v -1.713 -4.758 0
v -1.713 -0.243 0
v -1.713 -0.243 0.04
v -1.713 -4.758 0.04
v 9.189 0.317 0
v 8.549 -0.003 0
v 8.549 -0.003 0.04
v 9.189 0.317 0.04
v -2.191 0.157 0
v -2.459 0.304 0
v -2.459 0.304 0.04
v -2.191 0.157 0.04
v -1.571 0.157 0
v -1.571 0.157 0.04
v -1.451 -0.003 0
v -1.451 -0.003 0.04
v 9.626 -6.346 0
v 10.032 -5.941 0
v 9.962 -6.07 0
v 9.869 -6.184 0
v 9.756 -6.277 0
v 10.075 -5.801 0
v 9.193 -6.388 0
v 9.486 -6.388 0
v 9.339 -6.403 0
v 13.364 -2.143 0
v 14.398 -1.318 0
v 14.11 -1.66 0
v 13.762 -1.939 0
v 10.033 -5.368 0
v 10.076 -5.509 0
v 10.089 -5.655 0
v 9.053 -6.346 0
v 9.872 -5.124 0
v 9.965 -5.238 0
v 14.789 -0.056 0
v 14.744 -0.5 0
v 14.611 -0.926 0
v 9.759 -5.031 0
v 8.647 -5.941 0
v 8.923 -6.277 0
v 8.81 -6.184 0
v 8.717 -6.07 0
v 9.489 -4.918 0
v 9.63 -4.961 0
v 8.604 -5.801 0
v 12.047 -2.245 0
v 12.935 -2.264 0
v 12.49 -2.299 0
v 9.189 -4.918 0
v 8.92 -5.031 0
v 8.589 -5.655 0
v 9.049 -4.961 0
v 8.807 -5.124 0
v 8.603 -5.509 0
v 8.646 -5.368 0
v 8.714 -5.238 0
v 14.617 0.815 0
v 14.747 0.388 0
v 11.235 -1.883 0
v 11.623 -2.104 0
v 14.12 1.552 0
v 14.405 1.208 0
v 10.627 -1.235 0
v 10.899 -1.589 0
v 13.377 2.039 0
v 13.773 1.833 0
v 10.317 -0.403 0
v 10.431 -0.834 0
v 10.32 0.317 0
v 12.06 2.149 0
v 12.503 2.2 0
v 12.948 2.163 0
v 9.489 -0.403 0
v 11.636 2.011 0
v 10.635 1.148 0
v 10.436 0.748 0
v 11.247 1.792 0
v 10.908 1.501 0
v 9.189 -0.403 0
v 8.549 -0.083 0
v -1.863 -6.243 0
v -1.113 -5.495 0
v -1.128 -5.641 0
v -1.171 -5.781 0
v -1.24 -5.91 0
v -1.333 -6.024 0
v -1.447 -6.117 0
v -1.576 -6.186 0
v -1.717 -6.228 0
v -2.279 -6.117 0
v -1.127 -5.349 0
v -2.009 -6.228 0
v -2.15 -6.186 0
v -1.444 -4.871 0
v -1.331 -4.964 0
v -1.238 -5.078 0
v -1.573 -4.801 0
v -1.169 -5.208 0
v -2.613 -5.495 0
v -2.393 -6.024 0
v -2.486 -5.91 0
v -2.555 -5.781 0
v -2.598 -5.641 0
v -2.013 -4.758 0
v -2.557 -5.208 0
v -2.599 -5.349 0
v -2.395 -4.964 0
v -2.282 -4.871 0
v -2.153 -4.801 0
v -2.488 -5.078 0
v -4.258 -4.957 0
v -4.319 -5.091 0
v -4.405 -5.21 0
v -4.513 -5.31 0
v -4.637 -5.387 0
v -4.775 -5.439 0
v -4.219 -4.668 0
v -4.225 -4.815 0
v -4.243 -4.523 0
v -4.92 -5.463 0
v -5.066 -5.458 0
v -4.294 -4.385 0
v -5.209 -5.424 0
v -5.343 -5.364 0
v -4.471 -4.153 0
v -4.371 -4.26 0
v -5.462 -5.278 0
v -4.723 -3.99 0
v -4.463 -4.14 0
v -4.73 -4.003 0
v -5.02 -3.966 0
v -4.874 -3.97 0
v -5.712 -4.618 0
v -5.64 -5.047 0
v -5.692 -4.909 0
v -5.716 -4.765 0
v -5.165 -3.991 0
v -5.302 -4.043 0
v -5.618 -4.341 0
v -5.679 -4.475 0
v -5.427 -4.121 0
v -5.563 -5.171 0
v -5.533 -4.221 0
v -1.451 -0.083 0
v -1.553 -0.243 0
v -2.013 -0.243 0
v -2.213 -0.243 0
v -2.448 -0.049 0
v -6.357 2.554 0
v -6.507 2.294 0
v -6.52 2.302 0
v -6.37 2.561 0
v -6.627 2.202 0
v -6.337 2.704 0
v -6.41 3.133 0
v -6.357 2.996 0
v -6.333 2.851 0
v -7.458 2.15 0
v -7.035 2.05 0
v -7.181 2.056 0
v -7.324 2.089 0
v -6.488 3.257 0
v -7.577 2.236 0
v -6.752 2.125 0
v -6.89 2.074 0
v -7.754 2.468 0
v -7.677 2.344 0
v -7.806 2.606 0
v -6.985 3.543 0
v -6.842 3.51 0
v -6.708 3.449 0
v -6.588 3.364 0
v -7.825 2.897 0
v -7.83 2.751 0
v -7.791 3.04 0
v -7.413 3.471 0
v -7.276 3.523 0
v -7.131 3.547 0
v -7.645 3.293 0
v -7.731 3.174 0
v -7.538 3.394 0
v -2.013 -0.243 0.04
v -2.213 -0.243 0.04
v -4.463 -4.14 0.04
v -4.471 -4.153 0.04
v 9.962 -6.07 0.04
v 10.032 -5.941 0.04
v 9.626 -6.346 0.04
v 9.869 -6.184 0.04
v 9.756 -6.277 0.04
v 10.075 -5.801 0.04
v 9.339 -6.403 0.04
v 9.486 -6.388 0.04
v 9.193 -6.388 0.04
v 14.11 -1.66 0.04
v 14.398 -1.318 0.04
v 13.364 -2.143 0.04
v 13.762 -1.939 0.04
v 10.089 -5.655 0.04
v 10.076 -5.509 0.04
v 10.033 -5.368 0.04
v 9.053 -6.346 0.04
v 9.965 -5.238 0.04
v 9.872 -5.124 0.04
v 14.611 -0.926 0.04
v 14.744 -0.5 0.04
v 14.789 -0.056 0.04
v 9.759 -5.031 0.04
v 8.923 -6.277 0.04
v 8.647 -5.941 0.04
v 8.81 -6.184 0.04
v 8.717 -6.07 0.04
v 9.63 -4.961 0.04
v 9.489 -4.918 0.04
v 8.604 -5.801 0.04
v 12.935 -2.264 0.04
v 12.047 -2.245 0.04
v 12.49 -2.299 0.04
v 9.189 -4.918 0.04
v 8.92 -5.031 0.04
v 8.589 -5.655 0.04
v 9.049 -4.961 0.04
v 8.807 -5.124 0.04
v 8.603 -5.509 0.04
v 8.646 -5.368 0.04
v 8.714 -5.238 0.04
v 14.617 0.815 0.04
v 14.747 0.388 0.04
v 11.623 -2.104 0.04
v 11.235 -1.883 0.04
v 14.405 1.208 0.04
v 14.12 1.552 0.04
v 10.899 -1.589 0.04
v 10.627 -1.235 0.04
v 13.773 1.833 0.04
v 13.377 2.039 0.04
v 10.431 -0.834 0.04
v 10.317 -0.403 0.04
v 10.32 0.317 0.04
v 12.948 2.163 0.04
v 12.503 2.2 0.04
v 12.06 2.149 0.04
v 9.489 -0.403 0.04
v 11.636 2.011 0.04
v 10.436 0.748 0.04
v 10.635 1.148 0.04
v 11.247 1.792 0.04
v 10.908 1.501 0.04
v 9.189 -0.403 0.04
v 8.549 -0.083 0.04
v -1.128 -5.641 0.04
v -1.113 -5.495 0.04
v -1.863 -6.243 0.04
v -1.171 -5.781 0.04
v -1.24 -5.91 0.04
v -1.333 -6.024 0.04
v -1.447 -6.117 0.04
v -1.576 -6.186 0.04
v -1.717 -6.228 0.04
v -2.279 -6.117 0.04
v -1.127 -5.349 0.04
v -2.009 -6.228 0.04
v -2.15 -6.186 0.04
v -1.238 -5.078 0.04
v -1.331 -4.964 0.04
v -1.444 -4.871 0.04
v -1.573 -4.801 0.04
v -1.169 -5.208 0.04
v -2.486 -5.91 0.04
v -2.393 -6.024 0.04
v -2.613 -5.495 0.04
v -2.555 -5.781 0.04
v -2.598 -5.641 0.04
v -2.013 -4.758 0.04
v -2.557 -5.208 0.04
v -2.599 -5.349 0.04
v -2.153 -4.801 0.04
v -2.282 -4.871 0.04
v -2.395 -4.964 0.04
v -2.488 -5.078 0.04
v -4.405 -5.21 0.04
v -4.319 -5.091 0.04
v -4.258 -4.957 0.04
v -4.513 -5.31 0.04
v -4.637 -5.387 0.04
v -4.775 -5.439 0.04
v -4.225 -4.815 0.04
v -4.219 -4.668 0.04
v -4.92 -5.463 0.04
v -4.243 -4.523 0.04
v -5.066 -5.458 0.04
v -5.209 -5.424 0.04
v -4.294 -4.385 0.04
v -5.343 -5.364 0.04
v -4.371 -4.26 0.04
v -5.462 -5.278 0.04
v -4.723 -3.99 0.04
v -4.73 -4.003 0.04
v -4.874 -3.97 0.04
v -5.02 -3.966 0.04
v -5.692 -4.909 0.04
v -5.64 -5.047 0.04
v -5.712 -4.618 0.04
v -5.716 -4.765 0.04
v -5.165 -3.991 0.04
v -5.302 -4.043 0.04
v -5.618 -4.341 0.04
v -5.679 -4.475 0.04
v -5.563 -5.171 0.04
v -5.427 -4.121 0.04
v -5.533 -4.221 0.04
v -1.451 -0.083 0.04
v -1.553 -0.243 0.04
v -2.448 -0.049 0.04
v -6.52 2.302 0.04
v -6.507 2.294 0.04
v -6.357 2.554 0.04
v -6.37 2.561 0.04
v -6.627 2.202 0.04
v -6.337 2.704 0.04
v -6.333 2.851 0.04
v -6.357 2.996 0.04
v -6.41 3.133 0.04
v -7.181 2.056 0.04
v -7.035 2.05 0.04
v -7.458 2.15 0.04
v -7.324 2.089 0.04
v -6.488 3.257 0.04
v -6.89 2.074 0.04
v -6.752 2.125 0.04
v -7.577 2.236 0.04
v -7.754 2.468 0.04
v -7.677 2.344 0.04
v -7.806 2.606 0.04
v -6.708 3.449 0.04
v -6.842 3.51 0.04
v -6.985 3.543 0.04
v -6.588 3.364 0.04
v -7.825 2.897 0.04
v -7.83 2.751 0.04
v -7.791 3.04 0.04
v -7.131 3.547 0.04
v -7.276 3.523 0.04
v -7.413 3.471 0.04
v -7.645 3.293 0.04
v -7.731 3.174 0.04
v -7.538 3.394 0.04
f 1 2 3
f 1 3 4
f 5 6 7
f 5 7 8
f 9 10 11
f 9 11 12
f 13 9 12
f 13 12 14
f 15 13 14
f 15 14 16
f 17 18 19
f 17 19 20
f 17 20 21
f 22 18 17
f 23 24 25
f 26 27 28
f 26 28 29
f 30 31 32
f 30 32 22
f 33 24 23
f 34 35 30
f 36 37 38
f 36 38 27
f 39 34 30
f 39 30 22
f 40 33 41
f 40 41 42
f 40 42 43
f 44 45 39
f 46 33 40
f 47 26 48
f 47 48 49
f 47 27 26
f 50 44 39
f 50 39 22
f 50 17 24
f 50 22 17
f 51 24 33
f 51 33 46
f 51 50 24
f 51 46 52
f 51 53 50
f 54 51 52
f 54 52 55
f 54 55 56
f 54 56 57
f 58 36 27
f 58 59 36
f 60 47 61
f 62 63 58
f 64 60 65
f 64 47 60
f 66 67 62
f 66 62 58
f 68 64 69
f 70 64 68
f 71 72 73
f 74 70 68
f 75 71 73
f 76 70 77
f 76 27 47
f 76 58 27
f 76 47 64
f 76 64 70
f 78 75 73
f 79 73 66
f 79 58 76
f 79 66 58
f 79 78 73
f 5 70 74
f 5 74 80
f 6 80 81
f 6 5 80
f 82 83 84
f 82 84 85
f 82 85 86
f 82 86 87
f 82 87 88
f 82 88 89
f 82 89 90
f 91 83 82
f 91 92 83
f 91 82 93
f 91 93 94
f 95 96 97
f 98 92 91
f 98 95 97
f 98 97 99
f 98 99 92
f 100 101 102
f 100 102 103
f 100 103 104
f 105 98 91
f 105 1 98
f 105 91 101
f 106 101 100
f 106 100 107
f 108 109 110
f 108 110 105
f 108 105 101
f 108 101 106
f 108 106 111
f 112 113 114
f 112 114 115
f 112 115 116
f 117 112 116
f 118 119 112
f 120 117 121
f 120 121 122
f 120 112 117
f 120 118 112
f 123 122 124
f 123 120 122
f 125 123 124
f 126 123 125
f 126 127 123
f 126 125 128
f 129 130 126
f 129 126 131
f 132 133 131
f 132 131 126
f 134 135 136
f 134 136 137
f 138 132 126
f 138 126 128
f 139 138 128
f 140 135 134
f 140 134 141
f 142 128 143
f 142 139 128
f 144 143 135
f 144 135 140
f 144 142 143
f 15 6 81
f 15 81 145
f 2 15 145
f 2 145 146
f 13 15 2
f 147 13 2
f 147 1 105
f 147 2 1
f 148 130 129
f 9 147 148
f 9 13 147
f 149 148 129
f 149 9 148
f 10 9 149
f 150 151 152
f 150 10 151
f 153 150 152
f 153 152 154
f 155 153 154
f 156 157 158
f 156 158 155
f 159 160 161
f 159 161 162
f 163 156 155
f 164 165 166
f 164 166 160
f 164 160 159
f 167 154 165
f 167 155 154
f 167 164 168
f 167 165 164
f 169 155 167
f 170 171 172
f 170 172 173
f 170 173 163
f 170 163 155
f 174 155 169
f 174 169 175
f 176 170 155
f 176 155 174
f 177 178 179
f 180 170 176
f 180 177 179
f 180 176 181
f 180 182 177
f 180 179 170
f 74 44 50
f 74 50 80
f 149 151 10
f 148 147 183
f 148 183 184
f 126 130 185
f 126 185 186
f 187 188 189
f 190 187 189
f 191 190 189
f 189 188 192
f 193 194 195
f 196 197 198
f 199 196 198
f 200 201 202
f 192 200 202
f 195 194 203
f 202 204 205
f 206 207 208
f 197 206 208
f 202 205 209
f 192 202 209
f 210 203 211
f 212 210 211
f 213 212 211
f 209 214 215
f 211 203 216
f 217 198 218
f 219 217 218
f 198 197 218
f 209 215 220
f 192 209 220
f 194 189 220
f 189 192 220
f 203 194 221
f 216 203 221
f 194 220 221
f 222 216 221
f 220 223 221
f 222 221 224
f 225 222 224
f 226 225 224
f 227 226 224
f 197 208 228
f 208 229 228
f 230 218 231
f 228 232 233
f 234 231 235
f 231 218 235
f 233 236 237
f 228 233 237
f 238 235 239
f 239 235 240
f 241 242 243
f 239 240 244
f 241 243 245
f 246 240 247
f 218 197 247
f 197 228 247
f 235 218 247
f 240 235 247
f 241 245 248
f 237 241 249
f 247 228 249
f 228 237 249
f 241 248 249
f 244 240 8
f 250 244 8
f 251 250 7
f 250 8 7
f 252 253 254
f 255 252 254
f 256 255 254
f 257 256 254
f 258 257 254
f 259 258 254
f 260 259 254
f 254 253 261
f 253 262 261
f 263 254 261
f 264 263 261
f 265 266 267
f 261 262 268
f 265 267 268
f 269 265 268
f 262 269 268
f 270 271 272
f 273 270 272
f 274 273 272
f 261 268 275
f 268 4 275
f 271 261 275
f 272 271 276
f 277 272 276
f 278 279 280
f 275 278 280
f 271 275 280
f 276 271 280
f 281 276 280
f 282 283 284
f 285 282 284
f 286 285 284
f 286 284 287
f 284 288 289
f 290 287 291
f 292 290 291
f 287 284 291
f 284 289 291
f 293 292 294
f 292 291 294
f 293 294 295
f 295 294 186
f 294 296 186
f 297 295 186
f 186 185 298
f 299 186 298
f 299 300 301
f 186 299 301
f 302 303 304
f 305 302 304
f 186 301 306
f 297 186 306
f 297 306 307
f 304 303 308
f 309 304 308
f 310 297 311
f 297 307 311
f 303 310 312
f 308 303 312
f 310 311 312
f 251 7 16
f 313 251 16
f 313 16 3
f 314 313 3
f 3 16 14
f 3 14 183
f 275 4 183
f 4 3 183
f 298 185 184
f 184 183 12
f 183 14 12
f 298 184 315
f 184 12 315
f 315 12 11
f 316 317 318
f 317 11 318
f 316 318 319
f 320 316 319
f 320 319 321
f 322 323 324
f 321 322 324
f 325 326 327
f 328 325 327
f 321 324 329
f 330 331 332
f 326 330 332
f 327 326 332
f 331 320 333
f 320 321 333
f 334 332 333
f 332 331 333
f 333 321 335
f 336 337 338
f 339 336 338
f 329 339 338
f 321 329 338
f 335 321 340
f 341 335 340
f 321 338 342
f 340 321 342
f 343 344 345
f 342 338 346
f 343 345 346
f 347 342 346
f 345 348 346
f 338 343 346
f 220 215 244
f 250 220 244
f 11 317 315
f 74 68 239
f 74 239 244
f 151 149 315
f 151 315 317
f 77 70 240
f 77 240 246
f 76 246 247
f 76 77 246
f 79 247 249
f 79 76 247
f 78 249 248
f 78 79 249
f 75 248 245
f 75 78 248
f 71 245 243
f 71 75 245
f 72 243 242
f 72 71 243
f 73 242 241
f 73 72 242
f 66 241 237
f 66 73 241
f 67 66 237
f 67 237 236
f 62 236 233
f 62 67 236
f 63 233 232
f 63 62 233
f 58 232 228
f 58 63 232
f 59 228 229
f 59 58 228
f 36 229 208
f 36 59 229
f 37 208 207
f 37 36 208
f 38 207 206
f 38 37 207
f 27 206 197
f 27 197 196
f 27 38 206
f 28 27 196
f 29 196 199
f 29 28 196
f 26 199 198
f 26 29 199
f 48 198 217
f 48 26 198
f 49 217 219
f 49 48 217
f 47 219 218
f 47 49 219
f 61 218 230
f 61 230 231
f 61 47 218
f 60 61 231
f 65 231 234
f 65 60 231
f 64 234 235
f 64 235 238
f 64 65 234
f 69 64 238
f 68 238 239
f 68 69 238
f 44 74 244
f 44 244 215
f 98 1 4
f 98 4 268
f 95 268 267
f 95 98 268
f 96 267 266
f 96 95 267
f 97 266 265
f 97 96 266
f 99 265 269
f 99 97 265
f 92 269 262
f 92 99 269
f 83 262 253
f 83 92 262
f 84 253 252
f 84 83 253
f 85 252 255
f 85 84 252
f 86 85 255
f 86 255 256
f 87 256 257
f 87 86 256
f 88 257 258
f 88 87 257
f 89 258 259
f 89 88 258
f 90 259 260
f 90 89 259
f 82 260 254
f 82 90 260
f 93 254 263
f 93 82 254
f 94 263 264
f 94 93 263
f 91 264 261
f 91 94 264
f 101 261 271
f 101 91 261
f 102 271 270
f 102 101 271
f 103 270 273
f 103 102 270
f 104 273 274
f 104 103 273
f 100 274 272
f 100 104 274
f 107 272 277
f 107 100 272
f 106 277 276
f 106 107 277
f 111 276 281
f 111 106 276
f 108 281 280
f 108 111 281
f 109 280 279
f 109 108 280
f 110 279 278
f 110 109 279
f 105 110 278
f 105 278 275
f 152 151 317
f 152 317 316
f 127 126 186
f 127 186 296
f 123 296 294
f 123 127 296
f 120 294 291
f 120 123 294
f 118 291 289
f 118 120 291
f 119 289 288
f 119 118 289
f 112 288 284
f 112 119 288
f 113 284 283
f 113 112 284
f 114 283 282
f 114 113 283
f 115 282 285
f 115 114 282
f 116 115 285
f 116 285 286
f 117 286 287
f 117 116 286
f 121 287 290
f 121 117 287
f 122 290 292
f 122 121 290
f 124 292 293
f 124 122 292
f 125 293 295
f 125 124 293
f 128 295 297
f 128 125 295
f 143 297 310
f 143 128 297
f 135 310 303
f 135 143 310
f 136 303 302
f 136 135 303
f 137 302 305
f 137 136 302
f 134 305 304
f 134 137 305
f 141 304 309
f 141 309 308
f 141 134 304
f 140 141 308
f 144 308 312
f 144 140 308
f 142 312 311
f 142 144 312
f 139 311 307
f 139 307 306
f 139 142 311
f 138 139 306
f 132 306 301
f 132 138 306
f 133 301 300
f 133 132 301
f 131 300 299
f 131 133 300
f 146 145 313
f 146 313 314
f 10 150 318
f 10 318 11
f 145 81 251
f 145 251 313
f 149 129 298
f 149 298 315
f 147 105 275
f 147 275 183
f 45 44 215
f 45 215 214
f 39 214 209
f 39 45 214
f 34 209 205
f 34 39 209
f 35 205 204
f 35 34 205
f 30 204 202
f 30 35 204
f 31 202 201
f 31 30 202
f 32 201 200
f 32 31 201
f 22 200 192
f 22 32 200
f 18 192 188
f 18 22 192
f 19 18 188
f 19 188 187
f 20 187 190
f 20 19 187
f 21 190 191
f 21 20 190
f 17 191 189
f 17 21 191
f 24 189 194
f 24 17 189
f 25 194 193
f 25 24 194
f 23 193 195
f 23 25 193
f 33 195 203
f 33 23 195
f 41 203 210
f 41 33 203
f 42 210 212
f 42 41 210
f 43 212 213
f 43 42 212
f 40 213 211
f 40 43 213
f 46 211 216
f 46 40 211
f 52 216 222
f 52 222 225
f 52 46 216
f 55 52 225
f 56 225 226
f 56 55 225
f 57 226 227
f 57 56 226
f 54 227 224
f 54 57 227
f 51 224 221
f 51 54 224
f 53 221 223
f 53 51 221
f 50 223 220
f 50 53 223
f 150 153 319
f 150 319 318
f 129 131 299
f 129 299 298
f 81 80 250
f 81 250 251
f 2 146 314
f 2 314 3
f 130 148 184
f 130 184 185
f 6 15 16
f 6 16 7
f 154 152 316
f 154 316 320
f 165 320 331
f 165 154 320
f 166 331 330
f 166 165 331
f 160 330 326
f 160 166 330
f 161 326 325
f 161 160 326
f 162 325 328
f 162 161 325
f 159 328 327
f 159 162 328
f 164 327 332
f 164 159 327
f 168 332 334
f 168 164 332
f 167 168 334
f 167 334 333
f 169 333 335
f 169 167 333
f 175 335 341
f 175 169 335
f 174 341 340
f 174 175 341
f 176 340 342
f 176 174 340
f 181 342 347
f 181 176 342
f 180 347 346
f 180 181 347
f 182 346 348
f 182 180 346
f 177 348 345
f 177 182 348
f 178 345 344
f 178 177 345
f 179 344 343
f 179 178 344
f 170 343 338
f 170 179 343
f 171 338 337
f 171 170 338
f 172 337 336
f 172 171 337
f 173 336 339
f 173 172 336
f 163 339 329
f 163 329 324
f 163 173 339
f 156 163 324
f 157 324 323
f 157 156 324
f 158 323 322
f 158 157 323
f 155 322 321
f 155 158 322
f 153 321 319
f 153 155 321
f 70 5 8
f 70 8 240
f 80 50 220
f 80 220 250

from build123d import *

# Parameters (mm, degrees)
BOSS_EXTRUDE1_DEPTH = 0.04


with BuildPart() as part:
    # Sketch1 → Boss-Extrude1 (new body)
    with BuildSketch(Plane.XY):
        with BuildLine():
            Line((-1.570502823, 0.15738204), (-1.450502823, -0.00261796))
            Line((-1.450502823, -0.00261796), (8.549497177, -0.00261796))
            Line((8.549497177, -0.00261796), (9.189497177, 0.31738204))
            Line((9.189497177, 0.31738204), (10.289497177, 0.31738204))
            Line((10.289497177, 0.31738204), (10.319580052, 0.31738204))
            ThreePointArc((10.319580052, 0.31738204), (14.789486943, -0.056102846), (10.317408472, -0.40261796))
            Line((10.317408472, -0.40261796), (10.289497177, -0.40261796))
            Line((10.289497177, -0.40261796), (9.489497177, -0.40261796))
            Line((9.489497177, -0.40261796), (9.489497177, -4.90261796))
            Line((9.489497177, -4.90261796), (9.489497177, -4.917771037))
            ThreePointArc((9.489497177, -4.917771037), (9.339497177, -6.40261796), (9.189497177, -4.917771037))
            Line((9.189497177, -4.917771037), (9.189497177, -4.90261796))
            Line((9.189497177, -4.90261796), (9.189497177, -0.40261796))
            Line((9.189497177, -0.40261796), (8.549497177, -0.08261796))
            Line((8.549497177, -0.08261796), (-1.450502823, -0.08261796))
            Line((-1.450502823, -0.08261796), (-1.553035543, -0.24261796))
            Line((-1.553035543, -0.24261796), (-1.713035543, -0.24261796))
            Line((-1.713035543, -0.24261796), (-1.713035543, -4.74261796))
            Line((-1.713035543, -4.74261796), (-1.713035543, -4.757771037))
            ThreePointArc((-1.713035543, -4.757771037), (-1.863035543, -6.24261796), (-2.013035543, -4.757771037))
            Line((-2.013035543, -4.757771037), (-2.013035543, -4.74261796))
            Line((-2.013035543, -4.74261796), (-2.013035543, -0.24261796))
            Line((-2.013035543, -0.24261796), (-2.213035543, -0.24261796))
            Line((-2.213035543, -0.24261796), (-4.46302474, -4.139738514))
            Line((-4.46302474, -4.139738514), (-4.470603357, -4.152862955))
            ThreePointArc((-4.470603357, -4.152862955), (-5.342938887, -5.363770652), (-4.730431778, -4.002851195))
            Line((-4.730431778, -4.002851195), (-4.722853967, -3.98972604))
            Line((-4.722853967, -3.98972604), (-2.447853967, -0.049310453))
            Line((-2.447853967, -0.049310453), (-6.506560021, 2.29398458))
            Line((-6.506560021, 2.29398458), (-6.519672146, 2.301573339))
            ThreePointArc((-6.519672146, 2.301573339), (-7.730602208, 3.173881322), (-6.369682971, 2.56136874))
            Line((-6.369682971, 2.56136874), (-6.356560021, 2.553792202))
            Line((-6.356560021, 2.553792202), (-2.459445704, 0.303792202))
            Line((-2.459445704, 0.303792202), (-2.191269912, 0.15738204))
            Line((-2.191269912, 0.15738204), (-1.850502745, 0.15738204))
            Line((-1.850502745, 0.15738204), (-1.570502823, 0.15738204))
        make_face()
    extrude(amount=BOSS_EXTRUDE1_DEPTH)


solid = part.part
